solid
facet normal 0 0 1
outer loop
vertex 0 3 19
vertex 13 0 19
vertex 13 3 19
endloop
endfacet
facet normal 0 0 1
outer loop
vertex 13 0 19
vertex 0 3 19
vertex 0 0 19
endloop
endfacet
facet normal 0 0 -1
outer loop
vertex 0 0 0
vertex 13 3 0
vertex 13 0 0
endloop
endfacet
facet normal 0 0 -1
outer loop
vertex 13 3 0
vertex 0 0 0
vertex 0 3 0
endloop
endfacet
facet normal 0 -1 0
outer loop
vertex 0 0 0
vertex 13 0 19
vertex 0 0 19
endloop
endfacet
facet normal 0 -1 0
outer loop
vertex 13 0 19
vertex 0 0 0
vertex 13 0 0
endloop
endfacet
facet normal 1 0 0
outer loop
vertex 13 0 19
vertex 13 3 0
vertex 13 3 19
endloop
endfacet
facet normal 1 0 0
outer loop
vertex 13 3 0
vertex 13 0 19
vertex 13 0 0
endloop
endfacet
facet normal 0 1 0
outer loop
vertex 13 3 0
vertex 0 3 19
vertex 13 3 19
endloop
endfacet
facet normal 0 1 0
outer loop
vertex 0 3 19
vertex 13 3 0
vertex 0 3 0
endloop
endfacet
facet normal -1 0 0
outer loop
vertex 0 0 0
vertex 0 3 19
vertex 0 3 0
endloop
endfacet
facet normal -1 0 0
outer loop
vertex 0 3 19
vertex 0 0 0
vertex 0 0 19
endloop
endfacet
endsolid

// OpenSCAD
// Generated by SolidPython 1.0.1 on 2020-07-29 00:46:55


cube(size = [13, 3, 19]);
/***********************************************
*********      SolidPython code:      **********
************************************************
 
# import packages: SolidPython
from solid import *
from solid.utils import *
from itertools import chain, combinations, permutations


class Resize:

    def __init__(self, scad_file):
        self.scad_file = scad_file
        #self.scad_file = import_scad(scad_file)
        # cone/cylinder param:
        self.r1 = 0
        self.r2 = 0
        self.h = 0
        # rectangular prism param:
        self.w = 0
        self.l = 0
        # ellipse param:
        self.r = 0

    # import OpenScad code (file name corresponds to shape)


    # classify shape + parameters
    def assign(self, param1, param2, param3):
        if self.scad_file == 'cone.scad':
            self.r1 = param1
            self.r2 = param2
            self.h = param3
        elif self.scad_file == 'cylinder.scad':
            self.r1 = param1
            self.r2 = param2
            self.h = param3
        elif self.scad_file == 'rectangularPrism.scad':
            self.h = param1
            self.l = param2
            self.w = param3
        else:
            self.r = param1
            self.h = param2

    # resize parameters
    def iterate(self):
        x = range(3, 20, 2)
        i = 1
        if self.scad_file == 'cone.scad':
            tempList = list(permutations(x, 2))
            for temp in tempList:
                param1 = temp[0]
                param2 = temp[1]
                filepath = 'produced_scad_files/' + 'cone' + str(param1) + '_' + str(param2) + '_' + '.scad'
                scad_render_to_file(cylinder(h=param1, r1=param2, r2=0), filepath)

        elif self.scad_file == 'cylinder.scad':
            tempList = list(permutations(x, 3))
            for temp in tempList:
                param1 = temp[0]
                param2 = temp[1]
                filepath = 'produced_scad_files/' + 'cylinder' + str(param1) + '_' + str(param2) + '_' + '.scad'
                scad_render_to_file(cylinder(h=param1, r1=param2, r2=param2), filepath)

        elif self.scad_file == 'rectangularPrism.scad':
            tempList = list(permutations(x, 3))
            for temp in tempList:
                param1 = temp[0]
                param2 = temp[1]
                param3 = temp[2]
                filepath = 'produced_scad_files/' + 'rectangularPrism' + str(param1) + '_' + str(param2) + '_' + str(
                    param3) + '.scad'
                scad_render_to_file(cube(size=(param1, param2, param3)), filepath)

        elif self.scad_file == 'ellipse.scad':
            tempList = list(permutations(x, 4))
            for temp in tempList:
                param1 = temp[0]
                param2 = temp[1]
                param3 = temp[2]
                param4 = temp[3]
                filepath = 'produced_scad_files/' + 'ellipse' + str(param1) + '_' + str(param2) + '_' + str(param3) + '_' + str(param4) + '.scad'
                scad_render_to_file(scale([param1, param2, param3])(sphere(r=param4)), filepath)

    def render_to_scadfile(self):
        scad_render_to_file(scad, 'example.scad') 
 
************************************************/
